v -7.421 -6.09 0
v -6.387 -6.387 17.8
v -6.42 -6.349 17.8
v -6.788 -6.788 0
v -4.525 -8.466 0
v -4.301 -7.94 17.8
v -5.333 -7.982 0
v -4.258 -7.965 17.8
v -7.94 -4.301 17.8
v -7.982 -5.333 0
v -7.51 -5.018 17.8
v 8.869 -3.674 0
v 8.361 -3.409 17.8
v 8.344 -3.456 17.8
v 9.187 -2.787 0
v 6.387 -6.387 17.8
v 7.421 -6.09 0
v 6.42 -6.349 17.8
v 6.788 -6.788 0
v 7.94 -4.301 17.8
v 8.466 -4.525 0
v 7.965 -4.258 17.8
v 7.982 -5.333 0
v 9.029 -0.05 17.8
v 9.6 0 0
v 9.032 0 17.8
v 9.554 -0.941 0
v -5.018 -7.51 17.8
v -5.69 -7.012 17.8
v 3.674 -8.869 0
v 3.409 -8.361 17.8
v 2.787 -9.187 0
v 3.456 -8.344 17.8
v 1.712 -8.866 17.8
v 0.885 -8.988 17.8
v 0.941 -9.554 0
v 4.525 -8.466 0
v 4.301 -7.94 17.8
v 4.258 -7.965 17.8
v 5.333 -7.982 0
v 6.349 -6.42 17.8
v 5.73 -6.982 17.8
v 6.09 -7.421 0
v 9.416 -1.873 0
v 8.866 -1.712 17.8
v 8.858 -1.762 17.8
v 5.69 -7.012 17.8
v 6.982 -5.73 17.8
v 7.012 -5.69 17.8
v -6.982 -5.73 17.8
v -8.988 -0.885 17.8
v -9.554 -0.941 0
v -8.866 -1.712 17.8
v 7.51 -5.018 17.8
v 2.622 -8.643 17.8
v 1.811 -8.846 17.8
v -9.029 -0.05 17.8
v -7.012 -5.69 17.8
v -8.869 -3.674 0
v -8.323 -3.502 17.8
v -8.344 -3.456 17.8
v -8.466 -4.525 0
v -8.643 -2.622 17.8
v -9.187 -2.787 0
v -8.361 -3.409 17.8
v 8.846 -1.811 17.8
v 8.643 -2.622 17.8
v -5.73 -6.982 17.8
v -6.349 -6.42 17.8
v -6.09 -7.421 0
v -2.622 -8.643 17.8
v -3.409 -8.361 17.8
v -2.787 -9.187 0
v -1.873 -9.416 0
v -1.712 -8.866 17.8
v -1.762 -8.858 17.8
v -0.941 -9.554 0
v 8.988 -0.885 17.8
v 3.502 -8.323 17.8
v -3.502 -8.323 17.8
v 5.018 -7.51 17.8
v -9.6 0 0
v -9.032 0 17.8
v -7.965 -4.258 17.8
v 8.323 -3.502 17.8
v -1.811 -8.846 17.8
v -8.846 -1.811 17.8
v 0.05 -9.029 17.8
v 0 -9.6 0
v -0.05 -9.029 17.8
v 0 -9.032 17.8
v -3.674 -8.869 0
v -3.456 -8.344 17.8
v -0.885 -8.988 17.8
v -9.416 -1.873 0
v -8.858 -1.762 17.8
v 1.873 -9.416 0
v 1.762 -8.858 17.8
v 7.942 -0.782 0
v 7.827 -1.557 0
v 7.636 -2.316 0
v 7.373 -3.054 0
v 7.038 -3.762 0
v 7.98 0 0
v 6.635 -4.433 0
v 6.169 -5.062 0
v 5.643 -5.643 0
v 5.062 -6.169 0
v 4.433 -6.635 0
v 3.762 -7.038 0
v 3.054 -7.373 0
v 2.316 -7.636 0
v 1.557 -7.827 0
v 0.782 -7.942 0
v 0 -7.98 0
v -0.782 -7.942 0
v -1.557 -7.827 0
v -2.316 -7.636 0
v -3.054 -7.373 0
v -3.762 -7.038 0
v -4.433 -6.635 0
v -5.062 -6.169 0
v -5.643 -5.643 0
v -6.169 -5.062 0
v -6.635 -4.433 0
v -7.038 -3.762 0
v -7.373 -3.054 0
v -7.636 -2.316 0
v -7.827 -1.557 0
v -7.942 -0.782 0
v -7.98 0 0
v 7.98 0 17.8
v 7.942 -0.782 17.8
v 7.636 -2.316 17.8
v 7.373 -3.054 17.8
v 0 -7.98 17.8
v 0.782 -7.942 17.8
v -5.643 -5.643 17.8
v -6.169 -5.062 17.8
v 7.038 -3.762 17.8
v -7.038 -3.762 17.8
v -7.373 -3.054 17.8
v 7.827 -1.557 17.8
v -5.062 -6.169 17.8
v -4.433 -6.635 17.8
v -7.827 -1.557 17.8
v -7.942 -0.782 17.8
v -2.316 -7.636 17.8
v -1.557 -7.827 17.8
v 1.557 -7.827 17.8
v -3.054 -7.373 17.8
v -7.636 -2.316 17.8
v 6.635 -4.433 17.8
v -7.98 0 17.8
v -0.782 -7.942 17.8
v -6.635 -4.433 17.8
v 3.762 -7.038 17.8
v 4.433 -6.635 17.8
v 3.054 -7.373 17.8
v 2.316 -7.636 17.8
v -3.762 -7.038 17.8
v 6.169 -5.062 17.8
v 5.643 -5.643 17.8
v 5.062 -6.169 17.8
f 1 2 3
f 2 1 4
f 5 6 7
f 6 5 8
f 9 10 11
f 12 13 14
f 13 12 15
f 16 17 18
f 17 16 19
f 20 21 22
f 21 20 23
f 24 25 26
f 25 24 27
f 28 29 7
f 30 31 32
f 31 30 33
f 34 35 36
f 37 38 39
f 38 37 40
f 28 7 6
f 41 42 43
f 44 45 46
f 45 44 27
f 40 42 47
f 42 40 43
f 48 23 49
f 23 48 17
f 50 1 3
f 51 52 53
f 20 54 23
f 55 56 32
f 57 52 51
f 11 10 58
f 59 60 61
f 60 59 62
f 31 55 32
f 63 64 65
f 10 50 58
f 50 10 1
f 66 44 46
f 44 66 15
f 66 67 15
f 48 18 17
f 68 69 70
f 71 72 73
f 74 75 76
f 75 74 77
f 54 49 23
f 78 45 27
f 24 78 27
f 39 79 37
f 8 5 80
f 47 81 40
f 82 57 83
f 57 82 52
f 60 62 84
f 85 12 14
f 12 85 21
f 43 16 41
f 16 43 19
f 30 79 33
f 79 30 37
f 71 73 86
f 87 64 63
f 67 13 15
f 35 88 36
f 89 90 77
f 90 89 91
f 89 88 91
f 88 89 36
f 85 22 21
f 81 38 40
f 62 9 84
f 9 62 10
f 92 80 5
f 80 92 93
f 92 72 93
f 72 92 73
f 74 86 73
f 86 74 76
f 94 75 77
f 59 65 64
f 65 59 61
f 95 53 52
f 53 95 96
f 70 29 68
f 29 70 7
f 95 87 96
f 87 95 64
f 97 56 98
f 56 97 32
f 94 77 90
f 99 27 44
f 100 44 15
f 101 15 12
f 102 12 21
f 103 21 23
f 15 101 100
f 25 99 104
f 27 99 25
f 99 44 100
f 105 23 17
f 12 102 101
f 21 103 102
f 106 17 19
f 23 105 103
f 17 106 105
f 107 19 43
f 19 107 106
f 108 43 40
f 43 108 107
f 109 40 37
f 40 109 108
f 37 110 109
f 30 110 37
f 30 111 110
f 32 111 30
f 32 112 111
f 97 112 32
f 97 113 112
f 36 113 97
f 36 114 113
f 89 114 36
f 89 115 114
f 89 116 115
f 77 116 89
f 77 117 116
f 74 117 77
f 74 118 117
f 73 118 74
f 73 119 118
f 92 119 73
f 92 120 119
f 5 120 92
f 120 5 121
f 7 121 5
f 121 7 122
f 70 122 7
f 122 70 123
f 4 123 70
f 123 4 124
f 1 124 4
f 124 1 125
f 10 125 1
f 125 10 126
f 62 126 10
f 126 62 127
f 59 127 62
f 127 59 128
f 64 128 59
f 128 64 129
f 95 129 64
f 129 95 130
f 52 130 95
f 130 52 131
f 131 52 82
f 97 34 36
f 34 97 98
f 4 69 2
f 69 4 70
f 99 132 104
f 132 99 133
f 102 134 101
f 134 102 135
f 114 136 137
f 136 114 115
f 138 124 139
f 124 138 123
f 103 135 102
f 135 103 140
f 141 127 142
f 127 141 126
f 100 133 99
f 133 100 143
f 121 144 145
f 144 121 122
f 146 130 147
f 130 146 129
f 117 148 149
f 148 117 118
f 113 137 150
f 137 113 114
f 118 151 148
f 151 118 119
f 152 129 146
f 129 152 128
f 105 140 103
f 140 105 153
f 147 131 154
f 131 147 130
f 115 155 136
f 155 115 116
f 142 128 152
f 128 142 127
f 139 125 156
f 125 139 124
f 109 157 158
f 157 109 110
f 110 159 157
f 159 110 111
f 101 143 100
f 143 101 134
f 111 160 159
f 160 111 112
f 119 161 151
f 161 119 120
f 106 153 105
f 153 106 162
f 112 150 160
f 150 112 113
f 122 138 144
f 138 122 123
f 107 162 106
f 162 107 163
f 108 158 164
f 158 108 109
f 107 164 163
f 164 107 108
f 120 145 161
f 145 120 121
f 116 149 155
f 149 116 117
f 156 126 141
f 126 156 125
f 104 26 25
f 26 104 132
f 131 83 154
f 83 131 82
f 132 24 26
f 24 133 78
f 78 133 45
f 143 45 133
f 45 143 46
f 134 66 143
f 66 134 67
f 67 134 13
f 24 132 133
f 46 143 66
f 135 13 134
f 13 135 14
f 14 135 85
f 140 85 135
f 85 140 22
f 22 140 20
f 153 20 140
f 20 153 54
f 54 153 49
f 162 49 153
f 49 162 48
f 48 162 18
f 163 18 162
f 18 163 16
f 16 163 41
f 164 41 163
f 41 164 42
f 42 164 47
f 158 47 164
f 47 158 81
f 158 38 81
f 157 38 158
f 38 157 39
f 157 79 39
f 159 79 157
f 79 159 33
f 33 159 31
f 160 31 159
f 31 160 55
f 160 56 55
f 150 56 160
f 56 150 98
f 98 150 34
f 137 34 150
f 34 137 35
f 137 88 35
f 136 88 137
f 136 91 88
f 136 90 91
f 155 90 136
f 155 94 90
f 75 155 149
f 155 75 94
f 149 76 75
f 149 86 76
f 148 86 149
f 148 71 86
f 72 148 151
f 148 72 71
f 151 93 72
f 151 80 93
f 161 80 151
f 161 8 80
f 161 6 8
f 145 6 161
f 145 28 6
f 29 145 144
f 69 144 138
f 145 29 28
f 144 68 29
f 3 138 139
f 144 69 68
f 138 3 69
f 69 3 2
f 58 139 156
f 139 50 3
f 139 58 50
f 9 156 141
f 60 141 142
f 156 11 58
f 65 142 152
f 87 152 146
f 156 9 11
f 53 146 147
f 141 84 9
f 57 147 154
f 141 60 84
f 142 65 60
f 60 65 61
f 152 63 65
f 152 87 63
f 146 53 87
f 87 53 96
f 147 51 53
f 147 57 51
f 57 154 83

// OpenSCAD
// To be used for both import and standalone

$fn=64;


inner_wall_min = 1;
inner_wall_max = 1.6;
outer_wall = 1.8 + inner_wall_min;
kerf = 0.02;
default_h = 20;
stop_thick = 1.2;

//outer_cuff(8);
inner_cuff_half(8);

module outer_cuff(pipe_radius, height=default_h) {
  h = height - stop_thick;
  translate([0,0,stop_thick])
  difference() {
      cylinder(r=pipe_radius + outer_wall, h=h);
      
      cylinder(h=h,
        r1=pipe_radius + inner_wall_min,
        r2=pipe_radius + inner_wall_max);
  }
  difference() {
    cylinder(h=stop_thick, r=pipe_radius + outer_wall);
      
    cylinder(h=stop_thick, r=pipe_radius);
  }
}

module inner_cuff_half(pipe_radius, height=default_h) {
  h = height - stop_thick;
  difference() {
      cylinder(h=h,
        r1=pipe_radius + inner_wall_max,
        r2=pipe_radius + inner_wall_min);
      
      cylinder(r=pipe_radius - kerf, h=h);
      translate([-50,0,-10])
      cube([100,100,100]);
      translate([0,0,h])
      cube([100,100,2], center=true);
  }
}
    
